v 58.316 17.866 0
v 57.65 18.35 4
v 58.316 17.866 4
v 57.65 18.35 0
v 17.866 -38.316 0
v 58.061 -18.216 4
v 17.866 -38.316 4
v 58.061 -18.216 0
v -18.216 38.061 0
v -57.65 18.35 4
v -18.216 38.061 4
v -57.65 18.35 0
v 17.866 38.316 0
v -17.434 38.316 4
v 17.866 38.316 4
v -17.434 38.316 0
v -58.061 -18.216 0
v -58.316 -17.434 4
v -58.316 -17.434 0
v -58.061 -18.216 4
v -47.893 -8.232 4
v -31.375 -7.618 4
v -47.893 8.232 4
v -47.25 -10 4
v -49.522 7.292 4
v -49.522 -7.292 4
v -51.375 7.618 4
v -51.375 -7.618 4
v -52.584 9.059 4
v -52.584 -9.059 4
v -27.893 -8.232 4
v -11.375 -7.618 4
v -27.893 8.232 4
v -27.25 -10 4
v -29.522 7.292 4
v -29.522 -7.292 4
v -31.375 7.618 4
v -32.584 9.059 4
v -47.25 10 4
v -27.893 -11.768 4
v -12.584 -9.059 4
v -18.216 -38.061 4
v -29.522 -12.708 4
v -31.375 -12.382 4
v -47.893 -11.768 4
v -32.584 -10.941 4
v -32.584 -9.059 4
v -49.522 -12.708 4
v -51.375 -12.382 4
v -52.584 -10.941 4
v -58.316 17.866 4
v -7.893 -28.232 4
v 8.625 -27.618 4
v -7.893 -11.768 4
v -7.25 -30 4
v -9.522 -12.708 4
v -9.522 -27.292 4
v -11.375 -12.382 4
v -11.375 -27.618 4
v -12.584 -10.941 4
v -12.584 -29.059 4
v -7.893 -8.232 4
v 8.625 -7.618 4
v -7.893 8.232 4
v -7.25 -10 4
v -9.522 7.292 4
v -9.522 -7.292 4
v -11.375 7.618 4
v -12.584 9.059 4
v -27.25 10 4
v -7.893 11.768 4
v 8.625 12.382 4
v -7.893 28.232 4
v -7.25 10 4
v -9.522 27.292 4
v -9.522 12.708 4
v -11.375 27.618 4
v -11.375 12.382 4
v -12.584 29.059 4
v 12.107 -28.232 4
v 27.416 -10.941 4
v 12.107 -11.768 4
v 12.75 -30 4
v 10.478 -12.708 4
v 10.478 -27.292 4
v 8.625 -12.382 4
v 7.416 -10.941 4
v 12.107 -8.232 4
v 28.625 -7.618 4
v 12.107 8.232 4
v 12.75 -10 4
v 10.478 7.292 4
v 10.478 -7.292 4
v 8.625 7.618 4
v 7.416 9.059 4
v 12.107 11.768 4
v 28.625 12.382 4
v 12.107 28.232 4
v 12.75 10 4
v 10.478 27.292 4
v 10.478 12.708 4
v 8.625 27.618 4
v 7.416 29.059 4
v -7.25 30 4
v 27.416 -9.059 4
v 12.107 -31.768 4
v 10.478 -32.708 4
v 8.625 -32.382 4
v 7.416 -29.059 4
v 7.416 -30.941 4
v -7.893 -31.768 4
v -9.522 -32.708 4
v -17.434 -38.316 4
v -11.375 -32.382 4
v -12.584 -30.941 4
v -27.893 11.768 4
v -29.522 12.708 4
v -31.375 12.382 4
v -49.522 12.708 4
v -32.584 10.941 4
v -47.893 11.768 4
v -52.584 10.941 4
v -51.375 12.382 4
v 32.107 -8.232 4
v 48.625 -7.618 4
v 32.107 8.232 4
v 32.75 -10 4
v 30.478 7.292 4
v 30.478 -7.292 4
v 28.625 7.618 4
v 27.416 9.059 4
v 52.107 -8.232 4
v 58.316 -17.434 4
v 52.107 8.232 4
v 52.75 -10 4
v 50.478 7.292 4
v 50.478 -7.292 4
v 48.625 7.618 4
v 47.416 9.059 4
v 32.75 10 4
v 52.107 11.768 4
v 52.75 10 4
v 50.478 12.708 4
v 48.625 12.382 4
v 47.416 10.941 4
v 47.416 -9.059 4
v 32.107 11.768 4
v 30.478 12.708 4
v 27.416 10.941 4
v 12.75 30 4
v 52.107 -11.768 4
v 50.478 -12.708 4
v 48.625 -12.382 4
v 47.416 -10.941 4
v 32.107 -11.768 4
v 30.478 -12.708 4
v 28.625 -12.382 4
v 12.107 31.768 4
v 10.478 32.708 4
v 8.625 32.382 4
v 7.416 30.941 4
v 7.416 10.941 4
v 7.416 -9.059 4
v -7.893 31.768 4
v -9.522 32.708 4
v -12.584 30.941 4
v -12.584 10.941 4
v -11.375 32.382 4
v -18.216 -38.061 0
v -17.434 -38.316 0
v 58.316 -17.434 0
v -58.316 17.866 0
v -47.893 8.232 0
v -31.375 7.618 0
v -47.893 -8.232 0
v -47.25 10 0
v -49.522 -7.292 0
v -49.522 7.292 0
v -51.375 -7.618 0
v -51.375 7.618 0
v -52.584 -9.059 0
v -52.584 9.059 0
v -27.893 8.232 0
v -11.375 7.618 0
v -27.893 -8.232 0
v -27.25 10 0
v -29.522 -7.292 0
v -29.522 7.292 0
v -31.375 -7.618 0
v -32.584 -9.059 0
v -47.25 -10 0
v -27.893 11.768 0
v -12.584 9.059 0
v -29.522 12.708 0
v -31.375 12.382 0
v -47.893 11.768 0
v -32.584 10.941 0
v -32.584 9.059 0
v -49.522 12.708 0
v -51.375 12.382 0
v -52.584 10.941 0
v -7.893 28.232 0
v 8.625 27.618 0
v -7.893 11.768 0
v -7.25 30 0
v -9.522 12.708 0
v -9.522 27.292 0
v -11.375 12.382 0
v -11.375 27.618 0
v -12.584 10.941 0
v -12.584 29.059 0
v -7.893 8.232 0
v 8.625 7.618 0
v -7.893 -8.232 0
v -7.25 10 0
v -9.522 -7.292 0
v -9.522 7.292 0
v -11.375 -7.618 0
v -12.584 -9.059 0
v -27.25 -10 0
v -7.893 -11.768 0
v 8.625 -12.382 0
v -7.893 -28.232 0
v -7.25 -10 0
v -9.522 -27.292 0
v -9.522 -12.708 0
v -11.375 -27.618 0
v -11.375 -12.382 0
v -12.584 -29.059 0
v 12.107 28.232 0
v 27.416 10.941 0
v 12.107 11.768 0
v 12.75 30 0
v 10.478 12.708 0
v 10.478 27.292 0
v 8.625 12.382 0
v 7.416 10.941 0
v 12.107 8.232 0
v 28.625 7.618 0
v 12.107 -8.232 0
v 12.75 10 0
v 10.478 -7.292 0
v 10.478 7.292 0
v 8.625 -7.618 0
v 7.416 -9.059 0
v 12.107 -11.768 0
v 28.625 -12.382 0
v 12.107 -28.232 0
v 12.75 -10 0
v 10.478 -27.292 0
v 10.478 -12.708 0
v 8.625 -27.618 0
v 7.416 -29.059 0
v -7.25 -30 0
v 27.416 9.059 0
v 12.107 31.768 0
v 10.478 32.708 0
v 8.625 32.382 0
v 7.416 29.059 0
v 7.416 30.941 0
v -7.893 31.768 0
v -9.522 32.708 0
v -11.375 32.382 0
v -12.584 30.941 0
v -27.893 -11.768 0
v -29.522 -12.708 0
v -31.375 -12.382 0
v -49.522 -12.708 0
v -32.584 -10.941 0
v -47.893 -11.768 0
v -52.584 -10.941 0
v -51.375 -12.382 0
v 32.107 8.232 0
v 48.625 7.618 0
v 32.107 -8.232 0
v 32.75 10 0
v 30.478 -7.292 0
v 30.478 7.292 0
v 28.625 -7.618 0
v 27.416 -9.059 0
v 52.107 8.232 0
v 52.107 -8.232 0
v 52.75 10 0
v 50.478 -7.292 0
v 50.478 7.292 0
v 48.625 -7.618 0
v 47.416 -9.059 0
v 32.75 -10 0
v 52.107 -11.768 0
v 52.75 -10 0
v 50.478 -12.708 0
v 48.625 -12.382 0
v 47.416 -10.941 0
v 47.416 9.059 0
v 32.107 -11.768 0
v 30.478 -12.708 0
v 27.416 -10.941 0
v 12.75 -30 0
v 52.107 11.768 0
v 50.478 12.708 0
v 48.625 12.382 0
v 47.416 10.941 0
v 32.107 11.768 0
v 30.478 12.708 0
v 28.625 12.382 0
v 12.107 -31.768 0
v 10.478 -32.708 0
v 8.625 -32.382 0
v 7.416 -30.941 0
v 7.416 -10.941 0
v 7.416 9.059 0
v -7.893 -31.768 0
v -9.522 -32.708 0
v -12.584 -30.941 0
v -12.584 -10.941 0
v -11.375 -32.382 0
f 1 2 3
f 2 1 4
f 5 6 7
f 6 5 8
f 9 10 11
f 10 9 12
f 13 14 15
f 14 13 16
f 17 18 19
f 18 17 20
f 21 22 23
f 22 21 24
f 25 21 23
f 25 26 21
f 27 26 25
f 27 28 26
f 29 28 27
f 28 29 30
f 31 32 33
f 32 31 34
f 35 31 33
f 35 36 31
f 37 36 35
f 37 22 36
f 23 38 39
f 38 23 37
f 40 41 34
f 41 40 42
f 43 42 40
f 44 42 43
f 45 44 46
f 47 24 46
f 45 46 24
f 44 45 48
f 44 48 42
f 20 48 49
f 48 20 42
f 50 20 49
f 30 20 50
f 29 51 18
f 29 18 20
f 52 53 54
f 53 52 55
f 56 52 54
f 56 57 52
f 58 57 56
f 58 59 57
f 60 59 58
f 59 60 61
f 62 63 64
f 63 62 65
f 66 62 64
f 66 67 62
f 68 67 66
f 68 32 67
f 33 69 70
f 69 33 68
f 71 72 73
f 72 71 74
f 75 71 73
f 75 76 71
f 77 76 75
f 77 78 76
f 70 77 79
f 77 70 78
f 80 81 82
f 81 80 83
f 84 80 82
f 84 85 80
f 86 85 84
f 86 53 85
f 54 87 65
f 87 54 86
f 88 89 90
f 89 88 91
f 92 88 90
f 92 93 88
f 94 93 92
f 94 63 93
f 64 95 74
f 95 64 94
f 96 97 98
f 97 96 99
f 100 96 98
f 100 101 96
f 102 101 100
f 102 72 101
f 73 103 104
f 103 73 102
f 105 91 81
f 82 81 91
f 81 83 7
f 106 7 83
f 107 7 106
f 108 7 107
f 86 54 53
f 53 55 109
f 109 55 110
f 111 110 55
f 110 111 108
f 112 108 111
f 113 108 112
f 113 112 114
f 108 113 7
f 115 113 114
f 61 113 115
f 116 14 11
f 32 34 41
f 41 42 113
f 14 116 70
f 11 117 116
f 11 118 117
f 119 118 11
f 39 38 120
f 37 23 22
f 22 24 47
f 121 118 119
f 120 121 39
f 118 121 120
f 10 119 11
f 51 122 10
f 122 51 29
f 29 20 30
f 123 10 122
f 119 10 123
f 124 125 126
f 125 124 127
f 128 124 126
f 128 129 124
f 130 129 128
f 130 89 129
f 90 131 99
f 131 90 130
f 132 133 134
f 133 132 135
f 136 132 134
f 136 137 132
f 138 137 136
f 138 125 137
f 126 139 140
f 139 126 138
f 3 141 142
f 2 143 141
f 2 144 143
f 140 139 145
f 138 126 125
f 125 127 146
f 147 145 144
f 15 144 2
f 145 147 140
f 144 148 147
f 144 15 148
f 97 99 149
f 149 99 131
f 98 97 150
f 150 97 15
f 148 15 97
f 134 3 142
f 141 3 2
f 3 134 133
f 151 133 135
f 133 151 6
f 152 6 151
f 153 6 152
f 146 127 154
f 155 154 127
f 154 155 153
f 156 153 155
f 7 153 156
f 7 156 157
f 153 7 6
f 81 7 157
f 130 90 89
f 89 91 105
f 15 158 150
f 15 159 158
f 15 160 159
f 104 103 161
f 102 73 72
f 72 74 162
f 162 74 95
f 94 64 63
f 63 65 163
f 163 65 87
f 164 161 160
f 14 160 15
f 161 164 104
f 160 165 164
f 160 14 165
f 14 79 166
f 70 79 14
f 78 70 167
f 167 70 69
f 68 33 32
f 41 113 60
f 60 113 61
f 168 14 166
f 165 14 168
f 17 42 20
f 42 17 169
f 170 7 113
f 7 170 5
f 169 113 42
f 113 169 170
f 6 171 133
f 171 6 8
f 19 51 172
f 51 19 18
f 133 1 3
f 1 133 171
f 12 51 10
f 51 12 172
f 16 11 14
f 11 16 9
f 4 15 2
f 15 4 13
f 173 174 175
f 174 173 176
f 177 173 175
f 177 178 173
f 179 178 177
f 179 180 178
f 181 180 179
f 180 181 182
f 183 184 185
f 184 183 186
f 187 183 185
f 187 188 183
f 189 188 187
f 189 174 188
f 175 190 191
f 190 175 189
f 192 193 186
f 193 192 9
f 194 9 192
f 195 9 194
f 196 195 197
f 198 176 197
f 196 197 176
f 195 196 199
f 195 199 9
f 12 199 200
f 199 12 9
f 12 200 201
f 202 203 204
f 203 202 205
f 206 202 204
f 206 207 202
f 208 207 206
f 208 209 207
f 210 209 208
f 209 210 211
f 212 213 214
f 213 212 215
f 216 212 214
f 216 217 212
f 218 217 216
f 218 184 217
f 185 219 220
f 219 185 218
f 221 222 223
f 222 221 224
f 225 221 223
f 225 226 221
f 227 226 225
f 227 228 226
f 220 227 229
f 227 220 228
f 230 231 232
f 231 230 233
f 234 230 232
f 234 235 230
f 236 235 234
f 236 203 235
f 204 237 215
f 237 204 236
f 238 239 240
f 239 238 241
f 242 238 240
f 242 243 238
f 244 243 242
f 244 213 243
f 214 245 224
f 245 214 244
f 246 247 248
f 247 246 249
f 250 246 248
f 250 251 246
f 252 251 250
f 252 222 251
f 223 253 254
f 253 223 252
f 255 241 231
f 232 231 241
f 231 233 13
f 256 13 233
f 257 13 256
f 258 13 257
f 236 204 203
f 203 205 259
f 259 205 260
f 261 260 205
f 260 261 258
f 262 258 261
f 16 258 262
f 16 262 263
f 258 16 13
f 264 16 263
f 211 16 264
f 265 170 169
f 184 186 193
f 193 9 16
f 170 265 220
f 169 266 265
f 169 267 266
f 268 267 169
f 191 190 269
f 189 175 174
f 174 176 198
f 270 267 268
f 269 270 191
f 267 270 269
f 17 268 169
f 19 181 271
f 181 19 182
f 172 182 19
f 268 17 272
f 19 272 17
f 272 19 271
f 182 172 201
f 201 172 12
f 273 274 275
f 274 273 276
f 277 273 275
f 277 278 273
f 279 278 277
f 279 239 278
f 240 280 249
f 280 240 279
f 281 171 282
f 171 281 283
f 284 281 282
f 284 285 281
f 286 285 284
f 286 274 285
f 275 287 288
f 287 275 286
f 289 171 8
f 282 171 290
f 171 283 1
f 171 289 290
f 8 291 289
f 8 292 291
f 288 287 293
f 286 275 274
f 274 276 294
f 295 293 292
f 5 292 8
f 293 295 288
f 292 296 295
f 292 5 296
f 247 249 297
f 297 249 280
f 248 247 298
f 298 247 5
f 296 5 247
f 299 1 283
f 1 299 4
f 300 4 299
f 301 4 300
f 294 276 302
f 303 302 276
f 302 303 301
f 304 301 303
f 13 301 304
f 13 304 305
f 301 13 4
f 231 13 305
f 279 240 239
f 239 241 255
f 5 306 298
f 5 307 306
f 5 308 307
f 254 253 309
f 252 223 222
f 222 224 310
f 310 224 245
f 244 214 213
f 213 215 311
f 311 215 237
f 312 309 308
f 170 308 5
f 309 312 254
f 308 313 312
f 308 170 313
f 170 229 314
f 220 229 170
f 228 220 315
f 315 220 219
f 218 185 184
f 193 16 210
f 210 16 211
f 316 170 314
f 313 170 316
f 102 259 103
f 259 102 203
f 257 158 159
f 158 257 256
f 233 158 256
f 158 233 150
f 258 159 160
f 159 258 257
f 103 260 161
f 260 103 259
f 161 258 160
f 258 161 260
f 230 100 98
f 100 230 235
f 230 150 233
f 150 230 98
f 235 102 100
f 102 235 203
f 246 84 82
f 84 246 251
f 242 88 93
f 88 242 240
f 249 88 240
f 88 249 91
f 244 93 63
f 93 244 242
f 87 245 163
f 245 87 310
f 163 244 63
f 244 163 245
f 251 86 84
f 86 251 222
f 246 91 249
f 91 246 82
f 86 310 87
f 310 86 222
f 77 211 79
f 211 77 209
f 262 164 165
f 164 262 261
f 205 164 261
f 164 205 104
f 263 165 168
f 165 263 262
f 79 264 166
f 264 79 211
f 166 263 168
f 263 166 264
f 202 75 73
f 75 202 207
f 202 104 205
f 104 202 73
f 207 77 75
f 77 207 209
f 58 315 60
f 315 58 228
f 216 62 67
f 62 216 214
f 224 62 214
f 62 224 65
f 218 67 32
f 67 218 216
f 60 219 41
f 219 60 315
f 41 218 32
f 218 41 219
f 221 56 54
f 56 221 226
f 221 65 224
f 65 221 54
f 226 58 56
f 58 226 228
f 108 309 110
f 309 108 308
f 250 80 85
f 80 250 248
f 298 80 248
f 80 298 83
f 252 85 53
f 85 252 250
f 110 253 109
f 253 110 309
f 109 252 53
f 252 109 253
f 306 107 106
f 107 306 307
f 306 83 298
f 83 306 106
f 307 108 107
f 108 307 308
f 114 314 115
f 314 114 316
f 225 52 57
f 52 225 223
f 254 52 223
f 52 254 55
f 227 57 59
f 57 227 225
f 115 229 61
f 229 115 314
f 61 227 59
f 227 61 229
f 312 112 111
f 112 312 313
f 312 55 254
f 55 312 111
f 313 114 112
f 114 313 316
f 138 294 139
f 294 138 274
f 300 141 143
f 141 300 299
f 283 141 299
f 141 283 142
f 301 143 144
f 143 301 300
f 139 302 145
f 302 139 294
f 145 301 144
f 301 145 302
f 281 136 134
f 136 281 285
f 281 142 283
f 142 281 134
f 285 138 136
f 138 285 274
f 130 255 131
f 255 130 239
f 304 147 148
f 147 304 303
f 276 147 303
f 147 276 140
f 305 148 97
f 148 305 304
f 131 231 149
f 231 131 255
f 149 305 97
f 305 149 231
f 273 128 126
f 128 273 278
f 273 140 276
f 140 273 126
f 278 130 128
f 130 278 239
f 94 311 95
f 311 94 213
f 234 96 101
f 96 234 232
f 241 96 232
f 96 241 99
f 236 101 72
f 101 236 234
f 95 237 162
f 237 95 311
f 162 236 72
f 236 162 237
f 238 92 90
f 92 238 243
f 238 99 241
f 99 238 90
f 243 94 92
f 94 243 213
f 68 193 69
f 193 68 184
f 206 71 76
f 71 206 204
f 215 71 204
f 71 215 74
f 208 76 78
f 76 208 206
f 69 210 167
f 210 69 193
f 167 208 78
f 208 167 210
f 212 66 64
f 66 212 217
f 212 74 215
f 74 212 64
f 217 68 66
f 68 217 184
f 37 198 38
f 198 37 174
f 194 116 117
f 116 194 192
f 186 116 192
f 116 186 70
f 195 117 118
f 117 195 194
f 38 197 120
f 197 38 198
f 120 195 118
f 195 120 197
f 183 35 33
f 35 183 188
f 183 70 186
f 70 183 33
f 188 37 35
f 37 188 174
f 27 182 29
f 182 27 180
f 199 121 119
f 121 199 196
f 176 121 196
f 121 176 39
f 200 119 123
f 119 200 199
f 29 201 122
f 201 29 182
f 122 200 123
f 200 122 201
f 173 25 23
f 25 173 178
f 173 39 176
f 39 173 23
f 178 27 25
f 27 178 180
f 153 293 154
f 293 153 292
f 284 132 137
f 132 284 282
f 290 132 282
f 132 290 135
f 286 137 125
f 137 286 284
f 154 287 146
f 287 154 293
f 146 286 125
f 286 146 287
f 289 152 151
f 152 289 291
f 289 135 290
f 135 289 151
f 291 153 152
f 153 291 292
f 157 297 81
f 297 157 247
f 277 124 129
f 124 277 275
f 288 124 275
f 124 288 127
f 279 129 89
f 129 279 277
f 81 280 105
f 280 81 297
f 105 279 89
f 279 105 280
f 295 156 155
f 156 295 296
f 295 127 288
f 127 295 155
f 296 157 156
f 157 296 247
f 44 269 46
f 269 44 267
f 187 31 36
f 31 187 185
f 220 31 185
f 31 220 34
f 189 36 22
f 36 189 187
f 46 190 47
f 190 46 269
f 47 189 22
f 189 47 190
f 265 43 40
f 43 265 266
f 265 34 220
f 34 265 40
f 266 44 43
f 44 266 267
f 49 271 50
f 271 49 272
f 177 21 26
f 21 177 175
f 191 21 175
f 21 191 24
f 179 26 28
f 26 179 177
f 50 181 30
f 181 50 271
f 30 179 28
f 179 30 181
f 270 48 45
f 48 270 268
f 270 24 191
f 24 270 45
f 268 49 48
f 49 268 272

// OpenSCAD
// rob@openpart.co.uk 20140202-23:00
// 16 hole cross joining plate for 40mm NOMINAL extrusion
// V-Slot & others

module roundedRect(size, radius)
{
	x = size[0];
	y = size[1];
	z = size[2];
	linear_extrude(height=z)
	hull()
	{
		// place 4 circles in the corners, with the given radius
		translate([(-x/2)+(radius/2), (-y/2)+(radius/2), 0])
		circle(r=radius);
		translate([(x/2)-(radius/2), (-y/2)+(radius/2), 0])
		circle(r=radius);
		translate([(-x/2)+(radius/2), (y/2)-(radius/2), 0])
		circle(r=radius);
		translate([(x/2)-(radius/2), (y/2)-(radius/2), 0])
		circle(r=radius);
	}
}

hole = 5.5 / 2;
plate_width1 = 76;
plate_width2 = 116;
plate_length = 36;
plate_thickness = 4;
extend_past_thickness = 2;
corner_radius = 0.7;
difference () {
hull () {
	translate([0, 0, 0])
		roundedRect ([plate_length, plate_width1, plate_thickness], corner_radius);
	rotate (90,0,0) {

	translate([0, 0, 0])
		roundedRect ([plate_length, plate_width2, plate_thickness], corner_radius);
}}

	translate([10,30,-1])
		cylinder(h = (extend_past_thickness+plate_thickness+2), r = hole);
	translate([10,-10,-1])
		cylinder(h = (extend_past_thickness+plate_thickness+2), r = hole);
	translate([-10,30,-1])
		cylinder(h = (extend_past_thickness+plate_thickness+2), r = hole);
	translate([-10,-10,-1])
		cylinder(h = (extend_past_thickness+plate_thickness+2), r = hole);
	translate([10,-30,-1])
		cylinder(h = (extend_past_thickness+plate_thickness+2), r = hole);
	translate([-10,-30,-1])
		cylinder(h = (extend_past_thickness+plate_thickness+2), r = hole);
	translate([50,10,-1])
		cylinder(h = (extend_past_thickness+plate_thickness+2), r = hole);
	translate([30,10,-1])
		cylinder(h = (extend_past_thickness+plate_thickness+2), r = hole);
	translate([10,10,-1])
		cylinder(h = (extend_past_thickness+plate_thickness+2), r = hole);
	translate([-10,10,-1])
		cylinder(h = (extend_past_thickness+plate_thickness+2), r = hole);
	translate([-30,10,-1])
		cylinder(h = (extend_past_thickness+plate_thickness+2), r = hole);
	translate([-50,10,-1])
		cylinder(h = (extend_past_thickness+plate_thickness+2), r = hole);
	translate([50,-10,-1])
		cylinder(h = (extend_past_thickness+plate_thickness+2), r = hole);
	translate([30,-10,-1])
		cylinder(h = (extend_past_thickness+plate_thickness+2), r = hole);
	translate([-30,-10,-1])
		cylinder(h = (extend_past_thickness+plate_thickness+2), r = hole);
	translate([-50,-10,-1])
		cylinder(h = (extend_past_thickness+plate_thickness+2), r = hole);

}
	
